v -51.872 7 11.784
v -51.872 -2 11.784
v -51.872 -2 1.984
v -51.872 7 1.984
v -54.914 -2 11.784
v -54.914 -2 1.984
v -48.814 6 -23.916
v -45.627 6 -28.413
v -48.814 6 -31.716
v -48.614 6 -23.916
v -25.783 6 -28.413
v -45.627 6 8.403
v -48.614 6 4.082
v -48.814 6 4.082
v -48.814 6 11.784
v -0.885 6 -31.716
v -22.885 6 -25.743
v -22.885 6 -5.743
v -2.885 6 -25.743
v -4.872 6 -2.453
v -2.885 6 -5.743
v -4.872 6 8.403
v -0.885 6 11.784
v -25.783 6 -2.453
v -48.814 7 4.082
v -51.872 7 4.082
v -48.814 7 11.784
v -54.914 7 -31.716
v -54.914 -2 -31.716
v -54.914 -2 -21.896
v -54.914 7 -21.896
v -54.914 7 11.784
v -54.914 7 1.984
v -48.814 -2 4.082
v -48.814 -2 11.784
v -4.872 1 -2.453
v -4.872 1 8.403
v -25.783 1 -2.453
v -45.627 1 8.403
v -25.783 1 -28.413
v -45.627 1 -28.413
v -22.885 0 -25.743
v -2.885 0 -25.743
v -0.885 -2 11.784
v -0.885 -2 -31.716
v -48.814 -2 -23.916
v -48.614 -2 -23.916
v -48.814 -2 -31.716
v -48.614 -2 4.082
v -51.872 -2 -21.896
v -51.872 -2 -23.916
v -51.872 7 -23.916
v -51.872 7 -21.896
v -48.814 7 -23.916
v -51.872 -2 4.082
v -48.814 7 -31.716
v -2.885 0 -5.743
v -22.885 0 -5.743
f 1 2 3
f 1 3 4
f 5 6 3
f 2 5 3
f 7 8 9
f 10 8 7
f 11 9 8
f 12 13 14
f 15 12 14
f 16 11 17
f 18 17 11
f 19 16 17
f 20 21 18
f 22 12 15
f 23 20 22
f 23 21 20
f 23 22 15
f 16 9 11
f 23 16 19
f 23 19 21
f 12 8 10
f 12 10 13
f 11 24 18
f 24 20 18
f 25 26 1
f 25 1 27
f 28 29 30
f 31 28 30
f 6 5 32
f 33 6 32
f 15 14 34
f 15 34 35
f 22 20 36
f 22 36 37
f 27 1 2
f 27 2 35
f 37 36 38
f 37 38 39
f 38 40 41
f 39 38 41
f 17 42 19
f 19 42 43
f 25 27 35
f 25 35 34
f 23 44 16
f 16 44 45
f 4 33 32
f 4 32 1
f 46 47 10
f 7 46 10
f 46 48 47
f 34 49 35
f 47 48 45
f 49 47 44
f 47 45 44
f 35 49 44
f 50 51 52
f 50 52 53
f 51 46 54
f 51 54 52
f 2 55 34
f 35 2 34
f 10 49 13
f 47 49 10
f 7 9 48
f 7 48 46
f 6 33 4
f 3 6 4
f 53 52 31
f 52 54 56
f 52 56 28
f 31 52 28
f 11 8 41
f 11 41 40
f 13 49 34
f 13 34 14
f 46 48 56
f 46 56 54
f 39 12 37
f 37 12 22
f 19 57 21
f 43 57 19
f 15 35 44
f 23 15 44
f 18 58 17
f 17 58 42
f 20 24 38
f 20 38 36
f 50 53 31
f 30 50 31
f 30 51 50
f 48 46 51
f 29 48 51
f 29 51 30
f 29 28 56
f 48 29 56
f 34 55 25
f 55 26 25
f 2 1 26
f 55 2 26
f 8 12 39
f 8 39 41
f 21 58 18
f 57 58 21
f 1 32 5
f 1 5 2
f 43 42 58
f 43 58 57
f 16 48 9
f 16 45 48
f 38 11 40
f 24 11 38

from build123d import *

# Parameters (mm, degrees)
SKETCH_1_W           = 47.7290867
SKETCH_1_H           = 43.5
EXTRUDE_1_DEPTH      = 2
SKETCH_1_4_W         = 47.7290867
SKETCH_1_4_H         = 43.5
SKETCH_1_4_W_2       = 20
SKETCH_1_4_H_2       = 20
EXTRUDE_2_DEPTH      = 6
SKETCH_6_W           = 3.057803049
SKETCH_6_H           = 7.702499636
EXTRUDE_5_DEPTH      = 1
EXTRUDE_5_DEPTH_BACK = 8
SKETCH_5_W           = 3.042196951
SKETCH_5_H           = 9
EXTRUDE_6_DEPTH      = 9.8
EXTRUDE_START        = -8
EXTRUDE_7_DEPTH      = 9
SKETCH_3_W           = 7.8
SKETCH_3_H           = 8
SKETCH_3_W_2         = 7.702499636
EXTRUDE_3_DEPTH      = 0.2
CUT_EXTRUDE_1_DEPTH  = 5


with BuildPart() as part:
    # Эскиз1 → Бобышка-Вытянуть1 (new body)
    with BuildSketch(Plane(origin=(0, 0, 0), x_dir=(1, 0, 0), z_dir=(0, 1, 0))):
        with Locations((-24.749678485, 9.965878375)):
            Rectangle(SKETCH_1_W, SKETCH_1_H)
    extrude(amount=-EXTRUDE_1_DEPTH)

    # Эскиз1<4> → Бобышка-Вытянуть2 (add)
    with BuildSketch(Plane(origin=(0, 0, 0), x_dir=(1, 0, 0), z_dir=(0, 1, 0))):
        with Locations((-24.749678485, 9.965878375)):
            Rectangle(SKETCH_1_4_W, SKETCH_1_4_H)
        with Locations((-12.885135135, 15.743243243)):
            Rectangle(SKETCH_1_4_W_2, SKETCH_1_4_H_2, mode=Mode.SUBTRACT)
    extrude(amount=EXTRUDE_2_DEPTH)

    # Эскиз3 → Бобышка-Вытянуть3 (add)
    with BuildSketch(Plane.ZY.offset(48.614221835)):
        with Locations((-27.815878375, 2)):
            Rectangle(SKETCH_3_W, SKETCH_3_H)
        with Locations((7.932871807, 2)):
            Rectangle(SKETCH_3_W_2, SKETCH_3_H)
    extrude(amount=EXTRUDE_3_DEPTH)

    # Эскиз8 → Вырез-Вытянуть1 (cut)
    with BuildSketch(Plane(origin=(0, 6, 0), x_dir=(1, 0, 0), z_dir=(0, 1, 0))):
        Polygon((-45.627384995, 28.412635597), (-25.782809099, 28.412635597), (-25.782809099, 2.453305659), (-4.872082547, 2.453305659), (-4.872082547, -8.403340898), (-25.782809099, -8.403340898), (-45.627384995, -8.403340898), align=None)
    extrude(amount=-CUT_EXTRUDE_1_DEPTH, mode=Mode.SUBTRACT)


with BuildPart() as body_2:
    # Эскиз6 → Бобышка-Вытянуть5 (new body, two sides)
    with BuildSketch(Plane(origin=(0, 6, 0), x_dir=(1, 0, 0), z_dir=(0, 1, 0))) as extrude_5_sk:
        with Locations((-50.34312336, -7.932871807)):
            Rectangle(SKETCH_6_W, SKETCH_6_H)
    extrude(amount=EXTRUDE_5_DEPTH)
    extrude(extrude_5_sk.sketch, amount=-EXTRUDE_5_DEPTH_BACK)


with BuildPart() as body_3:
    # Эскиз5 → Бобышка-Вытянуть6 (new body)
    with BuildSketch(Plane.XY.offset(11.784121625)):
        with Locations((-53.39312336, 2.5)):
            Rectangle(SKETCH_5_W, SKETCH_5_H)
    extrude(amount=-EXTRUDE_6_DEPTH)


with BuildPart() as body_4:
    # Эскиз7 → Бобышка-Вытянуть7 (new body)
    with BuildSketch(Plane(origin=(0, 6, 0), x_dir=(1, 0, 0), z_dir=(0, 1, 0)).offset(EXTRUDE_START)):
        Polygon((-54.914221835, 31.715878375), (-48.814221835, 31.715878375), (-48.814221835, 23.915878375), (-51.872024884, 23.915878375), (-51.872024884, 21.895746715), (-54.914221835, 21.895746715), (-54.914221835, 23.915878375), align=None)
    extrude(amount=EXTRUDE_7_DEPTH)


solid = Compound([part.part, body_2.part, body_3.part, body_4.part])
